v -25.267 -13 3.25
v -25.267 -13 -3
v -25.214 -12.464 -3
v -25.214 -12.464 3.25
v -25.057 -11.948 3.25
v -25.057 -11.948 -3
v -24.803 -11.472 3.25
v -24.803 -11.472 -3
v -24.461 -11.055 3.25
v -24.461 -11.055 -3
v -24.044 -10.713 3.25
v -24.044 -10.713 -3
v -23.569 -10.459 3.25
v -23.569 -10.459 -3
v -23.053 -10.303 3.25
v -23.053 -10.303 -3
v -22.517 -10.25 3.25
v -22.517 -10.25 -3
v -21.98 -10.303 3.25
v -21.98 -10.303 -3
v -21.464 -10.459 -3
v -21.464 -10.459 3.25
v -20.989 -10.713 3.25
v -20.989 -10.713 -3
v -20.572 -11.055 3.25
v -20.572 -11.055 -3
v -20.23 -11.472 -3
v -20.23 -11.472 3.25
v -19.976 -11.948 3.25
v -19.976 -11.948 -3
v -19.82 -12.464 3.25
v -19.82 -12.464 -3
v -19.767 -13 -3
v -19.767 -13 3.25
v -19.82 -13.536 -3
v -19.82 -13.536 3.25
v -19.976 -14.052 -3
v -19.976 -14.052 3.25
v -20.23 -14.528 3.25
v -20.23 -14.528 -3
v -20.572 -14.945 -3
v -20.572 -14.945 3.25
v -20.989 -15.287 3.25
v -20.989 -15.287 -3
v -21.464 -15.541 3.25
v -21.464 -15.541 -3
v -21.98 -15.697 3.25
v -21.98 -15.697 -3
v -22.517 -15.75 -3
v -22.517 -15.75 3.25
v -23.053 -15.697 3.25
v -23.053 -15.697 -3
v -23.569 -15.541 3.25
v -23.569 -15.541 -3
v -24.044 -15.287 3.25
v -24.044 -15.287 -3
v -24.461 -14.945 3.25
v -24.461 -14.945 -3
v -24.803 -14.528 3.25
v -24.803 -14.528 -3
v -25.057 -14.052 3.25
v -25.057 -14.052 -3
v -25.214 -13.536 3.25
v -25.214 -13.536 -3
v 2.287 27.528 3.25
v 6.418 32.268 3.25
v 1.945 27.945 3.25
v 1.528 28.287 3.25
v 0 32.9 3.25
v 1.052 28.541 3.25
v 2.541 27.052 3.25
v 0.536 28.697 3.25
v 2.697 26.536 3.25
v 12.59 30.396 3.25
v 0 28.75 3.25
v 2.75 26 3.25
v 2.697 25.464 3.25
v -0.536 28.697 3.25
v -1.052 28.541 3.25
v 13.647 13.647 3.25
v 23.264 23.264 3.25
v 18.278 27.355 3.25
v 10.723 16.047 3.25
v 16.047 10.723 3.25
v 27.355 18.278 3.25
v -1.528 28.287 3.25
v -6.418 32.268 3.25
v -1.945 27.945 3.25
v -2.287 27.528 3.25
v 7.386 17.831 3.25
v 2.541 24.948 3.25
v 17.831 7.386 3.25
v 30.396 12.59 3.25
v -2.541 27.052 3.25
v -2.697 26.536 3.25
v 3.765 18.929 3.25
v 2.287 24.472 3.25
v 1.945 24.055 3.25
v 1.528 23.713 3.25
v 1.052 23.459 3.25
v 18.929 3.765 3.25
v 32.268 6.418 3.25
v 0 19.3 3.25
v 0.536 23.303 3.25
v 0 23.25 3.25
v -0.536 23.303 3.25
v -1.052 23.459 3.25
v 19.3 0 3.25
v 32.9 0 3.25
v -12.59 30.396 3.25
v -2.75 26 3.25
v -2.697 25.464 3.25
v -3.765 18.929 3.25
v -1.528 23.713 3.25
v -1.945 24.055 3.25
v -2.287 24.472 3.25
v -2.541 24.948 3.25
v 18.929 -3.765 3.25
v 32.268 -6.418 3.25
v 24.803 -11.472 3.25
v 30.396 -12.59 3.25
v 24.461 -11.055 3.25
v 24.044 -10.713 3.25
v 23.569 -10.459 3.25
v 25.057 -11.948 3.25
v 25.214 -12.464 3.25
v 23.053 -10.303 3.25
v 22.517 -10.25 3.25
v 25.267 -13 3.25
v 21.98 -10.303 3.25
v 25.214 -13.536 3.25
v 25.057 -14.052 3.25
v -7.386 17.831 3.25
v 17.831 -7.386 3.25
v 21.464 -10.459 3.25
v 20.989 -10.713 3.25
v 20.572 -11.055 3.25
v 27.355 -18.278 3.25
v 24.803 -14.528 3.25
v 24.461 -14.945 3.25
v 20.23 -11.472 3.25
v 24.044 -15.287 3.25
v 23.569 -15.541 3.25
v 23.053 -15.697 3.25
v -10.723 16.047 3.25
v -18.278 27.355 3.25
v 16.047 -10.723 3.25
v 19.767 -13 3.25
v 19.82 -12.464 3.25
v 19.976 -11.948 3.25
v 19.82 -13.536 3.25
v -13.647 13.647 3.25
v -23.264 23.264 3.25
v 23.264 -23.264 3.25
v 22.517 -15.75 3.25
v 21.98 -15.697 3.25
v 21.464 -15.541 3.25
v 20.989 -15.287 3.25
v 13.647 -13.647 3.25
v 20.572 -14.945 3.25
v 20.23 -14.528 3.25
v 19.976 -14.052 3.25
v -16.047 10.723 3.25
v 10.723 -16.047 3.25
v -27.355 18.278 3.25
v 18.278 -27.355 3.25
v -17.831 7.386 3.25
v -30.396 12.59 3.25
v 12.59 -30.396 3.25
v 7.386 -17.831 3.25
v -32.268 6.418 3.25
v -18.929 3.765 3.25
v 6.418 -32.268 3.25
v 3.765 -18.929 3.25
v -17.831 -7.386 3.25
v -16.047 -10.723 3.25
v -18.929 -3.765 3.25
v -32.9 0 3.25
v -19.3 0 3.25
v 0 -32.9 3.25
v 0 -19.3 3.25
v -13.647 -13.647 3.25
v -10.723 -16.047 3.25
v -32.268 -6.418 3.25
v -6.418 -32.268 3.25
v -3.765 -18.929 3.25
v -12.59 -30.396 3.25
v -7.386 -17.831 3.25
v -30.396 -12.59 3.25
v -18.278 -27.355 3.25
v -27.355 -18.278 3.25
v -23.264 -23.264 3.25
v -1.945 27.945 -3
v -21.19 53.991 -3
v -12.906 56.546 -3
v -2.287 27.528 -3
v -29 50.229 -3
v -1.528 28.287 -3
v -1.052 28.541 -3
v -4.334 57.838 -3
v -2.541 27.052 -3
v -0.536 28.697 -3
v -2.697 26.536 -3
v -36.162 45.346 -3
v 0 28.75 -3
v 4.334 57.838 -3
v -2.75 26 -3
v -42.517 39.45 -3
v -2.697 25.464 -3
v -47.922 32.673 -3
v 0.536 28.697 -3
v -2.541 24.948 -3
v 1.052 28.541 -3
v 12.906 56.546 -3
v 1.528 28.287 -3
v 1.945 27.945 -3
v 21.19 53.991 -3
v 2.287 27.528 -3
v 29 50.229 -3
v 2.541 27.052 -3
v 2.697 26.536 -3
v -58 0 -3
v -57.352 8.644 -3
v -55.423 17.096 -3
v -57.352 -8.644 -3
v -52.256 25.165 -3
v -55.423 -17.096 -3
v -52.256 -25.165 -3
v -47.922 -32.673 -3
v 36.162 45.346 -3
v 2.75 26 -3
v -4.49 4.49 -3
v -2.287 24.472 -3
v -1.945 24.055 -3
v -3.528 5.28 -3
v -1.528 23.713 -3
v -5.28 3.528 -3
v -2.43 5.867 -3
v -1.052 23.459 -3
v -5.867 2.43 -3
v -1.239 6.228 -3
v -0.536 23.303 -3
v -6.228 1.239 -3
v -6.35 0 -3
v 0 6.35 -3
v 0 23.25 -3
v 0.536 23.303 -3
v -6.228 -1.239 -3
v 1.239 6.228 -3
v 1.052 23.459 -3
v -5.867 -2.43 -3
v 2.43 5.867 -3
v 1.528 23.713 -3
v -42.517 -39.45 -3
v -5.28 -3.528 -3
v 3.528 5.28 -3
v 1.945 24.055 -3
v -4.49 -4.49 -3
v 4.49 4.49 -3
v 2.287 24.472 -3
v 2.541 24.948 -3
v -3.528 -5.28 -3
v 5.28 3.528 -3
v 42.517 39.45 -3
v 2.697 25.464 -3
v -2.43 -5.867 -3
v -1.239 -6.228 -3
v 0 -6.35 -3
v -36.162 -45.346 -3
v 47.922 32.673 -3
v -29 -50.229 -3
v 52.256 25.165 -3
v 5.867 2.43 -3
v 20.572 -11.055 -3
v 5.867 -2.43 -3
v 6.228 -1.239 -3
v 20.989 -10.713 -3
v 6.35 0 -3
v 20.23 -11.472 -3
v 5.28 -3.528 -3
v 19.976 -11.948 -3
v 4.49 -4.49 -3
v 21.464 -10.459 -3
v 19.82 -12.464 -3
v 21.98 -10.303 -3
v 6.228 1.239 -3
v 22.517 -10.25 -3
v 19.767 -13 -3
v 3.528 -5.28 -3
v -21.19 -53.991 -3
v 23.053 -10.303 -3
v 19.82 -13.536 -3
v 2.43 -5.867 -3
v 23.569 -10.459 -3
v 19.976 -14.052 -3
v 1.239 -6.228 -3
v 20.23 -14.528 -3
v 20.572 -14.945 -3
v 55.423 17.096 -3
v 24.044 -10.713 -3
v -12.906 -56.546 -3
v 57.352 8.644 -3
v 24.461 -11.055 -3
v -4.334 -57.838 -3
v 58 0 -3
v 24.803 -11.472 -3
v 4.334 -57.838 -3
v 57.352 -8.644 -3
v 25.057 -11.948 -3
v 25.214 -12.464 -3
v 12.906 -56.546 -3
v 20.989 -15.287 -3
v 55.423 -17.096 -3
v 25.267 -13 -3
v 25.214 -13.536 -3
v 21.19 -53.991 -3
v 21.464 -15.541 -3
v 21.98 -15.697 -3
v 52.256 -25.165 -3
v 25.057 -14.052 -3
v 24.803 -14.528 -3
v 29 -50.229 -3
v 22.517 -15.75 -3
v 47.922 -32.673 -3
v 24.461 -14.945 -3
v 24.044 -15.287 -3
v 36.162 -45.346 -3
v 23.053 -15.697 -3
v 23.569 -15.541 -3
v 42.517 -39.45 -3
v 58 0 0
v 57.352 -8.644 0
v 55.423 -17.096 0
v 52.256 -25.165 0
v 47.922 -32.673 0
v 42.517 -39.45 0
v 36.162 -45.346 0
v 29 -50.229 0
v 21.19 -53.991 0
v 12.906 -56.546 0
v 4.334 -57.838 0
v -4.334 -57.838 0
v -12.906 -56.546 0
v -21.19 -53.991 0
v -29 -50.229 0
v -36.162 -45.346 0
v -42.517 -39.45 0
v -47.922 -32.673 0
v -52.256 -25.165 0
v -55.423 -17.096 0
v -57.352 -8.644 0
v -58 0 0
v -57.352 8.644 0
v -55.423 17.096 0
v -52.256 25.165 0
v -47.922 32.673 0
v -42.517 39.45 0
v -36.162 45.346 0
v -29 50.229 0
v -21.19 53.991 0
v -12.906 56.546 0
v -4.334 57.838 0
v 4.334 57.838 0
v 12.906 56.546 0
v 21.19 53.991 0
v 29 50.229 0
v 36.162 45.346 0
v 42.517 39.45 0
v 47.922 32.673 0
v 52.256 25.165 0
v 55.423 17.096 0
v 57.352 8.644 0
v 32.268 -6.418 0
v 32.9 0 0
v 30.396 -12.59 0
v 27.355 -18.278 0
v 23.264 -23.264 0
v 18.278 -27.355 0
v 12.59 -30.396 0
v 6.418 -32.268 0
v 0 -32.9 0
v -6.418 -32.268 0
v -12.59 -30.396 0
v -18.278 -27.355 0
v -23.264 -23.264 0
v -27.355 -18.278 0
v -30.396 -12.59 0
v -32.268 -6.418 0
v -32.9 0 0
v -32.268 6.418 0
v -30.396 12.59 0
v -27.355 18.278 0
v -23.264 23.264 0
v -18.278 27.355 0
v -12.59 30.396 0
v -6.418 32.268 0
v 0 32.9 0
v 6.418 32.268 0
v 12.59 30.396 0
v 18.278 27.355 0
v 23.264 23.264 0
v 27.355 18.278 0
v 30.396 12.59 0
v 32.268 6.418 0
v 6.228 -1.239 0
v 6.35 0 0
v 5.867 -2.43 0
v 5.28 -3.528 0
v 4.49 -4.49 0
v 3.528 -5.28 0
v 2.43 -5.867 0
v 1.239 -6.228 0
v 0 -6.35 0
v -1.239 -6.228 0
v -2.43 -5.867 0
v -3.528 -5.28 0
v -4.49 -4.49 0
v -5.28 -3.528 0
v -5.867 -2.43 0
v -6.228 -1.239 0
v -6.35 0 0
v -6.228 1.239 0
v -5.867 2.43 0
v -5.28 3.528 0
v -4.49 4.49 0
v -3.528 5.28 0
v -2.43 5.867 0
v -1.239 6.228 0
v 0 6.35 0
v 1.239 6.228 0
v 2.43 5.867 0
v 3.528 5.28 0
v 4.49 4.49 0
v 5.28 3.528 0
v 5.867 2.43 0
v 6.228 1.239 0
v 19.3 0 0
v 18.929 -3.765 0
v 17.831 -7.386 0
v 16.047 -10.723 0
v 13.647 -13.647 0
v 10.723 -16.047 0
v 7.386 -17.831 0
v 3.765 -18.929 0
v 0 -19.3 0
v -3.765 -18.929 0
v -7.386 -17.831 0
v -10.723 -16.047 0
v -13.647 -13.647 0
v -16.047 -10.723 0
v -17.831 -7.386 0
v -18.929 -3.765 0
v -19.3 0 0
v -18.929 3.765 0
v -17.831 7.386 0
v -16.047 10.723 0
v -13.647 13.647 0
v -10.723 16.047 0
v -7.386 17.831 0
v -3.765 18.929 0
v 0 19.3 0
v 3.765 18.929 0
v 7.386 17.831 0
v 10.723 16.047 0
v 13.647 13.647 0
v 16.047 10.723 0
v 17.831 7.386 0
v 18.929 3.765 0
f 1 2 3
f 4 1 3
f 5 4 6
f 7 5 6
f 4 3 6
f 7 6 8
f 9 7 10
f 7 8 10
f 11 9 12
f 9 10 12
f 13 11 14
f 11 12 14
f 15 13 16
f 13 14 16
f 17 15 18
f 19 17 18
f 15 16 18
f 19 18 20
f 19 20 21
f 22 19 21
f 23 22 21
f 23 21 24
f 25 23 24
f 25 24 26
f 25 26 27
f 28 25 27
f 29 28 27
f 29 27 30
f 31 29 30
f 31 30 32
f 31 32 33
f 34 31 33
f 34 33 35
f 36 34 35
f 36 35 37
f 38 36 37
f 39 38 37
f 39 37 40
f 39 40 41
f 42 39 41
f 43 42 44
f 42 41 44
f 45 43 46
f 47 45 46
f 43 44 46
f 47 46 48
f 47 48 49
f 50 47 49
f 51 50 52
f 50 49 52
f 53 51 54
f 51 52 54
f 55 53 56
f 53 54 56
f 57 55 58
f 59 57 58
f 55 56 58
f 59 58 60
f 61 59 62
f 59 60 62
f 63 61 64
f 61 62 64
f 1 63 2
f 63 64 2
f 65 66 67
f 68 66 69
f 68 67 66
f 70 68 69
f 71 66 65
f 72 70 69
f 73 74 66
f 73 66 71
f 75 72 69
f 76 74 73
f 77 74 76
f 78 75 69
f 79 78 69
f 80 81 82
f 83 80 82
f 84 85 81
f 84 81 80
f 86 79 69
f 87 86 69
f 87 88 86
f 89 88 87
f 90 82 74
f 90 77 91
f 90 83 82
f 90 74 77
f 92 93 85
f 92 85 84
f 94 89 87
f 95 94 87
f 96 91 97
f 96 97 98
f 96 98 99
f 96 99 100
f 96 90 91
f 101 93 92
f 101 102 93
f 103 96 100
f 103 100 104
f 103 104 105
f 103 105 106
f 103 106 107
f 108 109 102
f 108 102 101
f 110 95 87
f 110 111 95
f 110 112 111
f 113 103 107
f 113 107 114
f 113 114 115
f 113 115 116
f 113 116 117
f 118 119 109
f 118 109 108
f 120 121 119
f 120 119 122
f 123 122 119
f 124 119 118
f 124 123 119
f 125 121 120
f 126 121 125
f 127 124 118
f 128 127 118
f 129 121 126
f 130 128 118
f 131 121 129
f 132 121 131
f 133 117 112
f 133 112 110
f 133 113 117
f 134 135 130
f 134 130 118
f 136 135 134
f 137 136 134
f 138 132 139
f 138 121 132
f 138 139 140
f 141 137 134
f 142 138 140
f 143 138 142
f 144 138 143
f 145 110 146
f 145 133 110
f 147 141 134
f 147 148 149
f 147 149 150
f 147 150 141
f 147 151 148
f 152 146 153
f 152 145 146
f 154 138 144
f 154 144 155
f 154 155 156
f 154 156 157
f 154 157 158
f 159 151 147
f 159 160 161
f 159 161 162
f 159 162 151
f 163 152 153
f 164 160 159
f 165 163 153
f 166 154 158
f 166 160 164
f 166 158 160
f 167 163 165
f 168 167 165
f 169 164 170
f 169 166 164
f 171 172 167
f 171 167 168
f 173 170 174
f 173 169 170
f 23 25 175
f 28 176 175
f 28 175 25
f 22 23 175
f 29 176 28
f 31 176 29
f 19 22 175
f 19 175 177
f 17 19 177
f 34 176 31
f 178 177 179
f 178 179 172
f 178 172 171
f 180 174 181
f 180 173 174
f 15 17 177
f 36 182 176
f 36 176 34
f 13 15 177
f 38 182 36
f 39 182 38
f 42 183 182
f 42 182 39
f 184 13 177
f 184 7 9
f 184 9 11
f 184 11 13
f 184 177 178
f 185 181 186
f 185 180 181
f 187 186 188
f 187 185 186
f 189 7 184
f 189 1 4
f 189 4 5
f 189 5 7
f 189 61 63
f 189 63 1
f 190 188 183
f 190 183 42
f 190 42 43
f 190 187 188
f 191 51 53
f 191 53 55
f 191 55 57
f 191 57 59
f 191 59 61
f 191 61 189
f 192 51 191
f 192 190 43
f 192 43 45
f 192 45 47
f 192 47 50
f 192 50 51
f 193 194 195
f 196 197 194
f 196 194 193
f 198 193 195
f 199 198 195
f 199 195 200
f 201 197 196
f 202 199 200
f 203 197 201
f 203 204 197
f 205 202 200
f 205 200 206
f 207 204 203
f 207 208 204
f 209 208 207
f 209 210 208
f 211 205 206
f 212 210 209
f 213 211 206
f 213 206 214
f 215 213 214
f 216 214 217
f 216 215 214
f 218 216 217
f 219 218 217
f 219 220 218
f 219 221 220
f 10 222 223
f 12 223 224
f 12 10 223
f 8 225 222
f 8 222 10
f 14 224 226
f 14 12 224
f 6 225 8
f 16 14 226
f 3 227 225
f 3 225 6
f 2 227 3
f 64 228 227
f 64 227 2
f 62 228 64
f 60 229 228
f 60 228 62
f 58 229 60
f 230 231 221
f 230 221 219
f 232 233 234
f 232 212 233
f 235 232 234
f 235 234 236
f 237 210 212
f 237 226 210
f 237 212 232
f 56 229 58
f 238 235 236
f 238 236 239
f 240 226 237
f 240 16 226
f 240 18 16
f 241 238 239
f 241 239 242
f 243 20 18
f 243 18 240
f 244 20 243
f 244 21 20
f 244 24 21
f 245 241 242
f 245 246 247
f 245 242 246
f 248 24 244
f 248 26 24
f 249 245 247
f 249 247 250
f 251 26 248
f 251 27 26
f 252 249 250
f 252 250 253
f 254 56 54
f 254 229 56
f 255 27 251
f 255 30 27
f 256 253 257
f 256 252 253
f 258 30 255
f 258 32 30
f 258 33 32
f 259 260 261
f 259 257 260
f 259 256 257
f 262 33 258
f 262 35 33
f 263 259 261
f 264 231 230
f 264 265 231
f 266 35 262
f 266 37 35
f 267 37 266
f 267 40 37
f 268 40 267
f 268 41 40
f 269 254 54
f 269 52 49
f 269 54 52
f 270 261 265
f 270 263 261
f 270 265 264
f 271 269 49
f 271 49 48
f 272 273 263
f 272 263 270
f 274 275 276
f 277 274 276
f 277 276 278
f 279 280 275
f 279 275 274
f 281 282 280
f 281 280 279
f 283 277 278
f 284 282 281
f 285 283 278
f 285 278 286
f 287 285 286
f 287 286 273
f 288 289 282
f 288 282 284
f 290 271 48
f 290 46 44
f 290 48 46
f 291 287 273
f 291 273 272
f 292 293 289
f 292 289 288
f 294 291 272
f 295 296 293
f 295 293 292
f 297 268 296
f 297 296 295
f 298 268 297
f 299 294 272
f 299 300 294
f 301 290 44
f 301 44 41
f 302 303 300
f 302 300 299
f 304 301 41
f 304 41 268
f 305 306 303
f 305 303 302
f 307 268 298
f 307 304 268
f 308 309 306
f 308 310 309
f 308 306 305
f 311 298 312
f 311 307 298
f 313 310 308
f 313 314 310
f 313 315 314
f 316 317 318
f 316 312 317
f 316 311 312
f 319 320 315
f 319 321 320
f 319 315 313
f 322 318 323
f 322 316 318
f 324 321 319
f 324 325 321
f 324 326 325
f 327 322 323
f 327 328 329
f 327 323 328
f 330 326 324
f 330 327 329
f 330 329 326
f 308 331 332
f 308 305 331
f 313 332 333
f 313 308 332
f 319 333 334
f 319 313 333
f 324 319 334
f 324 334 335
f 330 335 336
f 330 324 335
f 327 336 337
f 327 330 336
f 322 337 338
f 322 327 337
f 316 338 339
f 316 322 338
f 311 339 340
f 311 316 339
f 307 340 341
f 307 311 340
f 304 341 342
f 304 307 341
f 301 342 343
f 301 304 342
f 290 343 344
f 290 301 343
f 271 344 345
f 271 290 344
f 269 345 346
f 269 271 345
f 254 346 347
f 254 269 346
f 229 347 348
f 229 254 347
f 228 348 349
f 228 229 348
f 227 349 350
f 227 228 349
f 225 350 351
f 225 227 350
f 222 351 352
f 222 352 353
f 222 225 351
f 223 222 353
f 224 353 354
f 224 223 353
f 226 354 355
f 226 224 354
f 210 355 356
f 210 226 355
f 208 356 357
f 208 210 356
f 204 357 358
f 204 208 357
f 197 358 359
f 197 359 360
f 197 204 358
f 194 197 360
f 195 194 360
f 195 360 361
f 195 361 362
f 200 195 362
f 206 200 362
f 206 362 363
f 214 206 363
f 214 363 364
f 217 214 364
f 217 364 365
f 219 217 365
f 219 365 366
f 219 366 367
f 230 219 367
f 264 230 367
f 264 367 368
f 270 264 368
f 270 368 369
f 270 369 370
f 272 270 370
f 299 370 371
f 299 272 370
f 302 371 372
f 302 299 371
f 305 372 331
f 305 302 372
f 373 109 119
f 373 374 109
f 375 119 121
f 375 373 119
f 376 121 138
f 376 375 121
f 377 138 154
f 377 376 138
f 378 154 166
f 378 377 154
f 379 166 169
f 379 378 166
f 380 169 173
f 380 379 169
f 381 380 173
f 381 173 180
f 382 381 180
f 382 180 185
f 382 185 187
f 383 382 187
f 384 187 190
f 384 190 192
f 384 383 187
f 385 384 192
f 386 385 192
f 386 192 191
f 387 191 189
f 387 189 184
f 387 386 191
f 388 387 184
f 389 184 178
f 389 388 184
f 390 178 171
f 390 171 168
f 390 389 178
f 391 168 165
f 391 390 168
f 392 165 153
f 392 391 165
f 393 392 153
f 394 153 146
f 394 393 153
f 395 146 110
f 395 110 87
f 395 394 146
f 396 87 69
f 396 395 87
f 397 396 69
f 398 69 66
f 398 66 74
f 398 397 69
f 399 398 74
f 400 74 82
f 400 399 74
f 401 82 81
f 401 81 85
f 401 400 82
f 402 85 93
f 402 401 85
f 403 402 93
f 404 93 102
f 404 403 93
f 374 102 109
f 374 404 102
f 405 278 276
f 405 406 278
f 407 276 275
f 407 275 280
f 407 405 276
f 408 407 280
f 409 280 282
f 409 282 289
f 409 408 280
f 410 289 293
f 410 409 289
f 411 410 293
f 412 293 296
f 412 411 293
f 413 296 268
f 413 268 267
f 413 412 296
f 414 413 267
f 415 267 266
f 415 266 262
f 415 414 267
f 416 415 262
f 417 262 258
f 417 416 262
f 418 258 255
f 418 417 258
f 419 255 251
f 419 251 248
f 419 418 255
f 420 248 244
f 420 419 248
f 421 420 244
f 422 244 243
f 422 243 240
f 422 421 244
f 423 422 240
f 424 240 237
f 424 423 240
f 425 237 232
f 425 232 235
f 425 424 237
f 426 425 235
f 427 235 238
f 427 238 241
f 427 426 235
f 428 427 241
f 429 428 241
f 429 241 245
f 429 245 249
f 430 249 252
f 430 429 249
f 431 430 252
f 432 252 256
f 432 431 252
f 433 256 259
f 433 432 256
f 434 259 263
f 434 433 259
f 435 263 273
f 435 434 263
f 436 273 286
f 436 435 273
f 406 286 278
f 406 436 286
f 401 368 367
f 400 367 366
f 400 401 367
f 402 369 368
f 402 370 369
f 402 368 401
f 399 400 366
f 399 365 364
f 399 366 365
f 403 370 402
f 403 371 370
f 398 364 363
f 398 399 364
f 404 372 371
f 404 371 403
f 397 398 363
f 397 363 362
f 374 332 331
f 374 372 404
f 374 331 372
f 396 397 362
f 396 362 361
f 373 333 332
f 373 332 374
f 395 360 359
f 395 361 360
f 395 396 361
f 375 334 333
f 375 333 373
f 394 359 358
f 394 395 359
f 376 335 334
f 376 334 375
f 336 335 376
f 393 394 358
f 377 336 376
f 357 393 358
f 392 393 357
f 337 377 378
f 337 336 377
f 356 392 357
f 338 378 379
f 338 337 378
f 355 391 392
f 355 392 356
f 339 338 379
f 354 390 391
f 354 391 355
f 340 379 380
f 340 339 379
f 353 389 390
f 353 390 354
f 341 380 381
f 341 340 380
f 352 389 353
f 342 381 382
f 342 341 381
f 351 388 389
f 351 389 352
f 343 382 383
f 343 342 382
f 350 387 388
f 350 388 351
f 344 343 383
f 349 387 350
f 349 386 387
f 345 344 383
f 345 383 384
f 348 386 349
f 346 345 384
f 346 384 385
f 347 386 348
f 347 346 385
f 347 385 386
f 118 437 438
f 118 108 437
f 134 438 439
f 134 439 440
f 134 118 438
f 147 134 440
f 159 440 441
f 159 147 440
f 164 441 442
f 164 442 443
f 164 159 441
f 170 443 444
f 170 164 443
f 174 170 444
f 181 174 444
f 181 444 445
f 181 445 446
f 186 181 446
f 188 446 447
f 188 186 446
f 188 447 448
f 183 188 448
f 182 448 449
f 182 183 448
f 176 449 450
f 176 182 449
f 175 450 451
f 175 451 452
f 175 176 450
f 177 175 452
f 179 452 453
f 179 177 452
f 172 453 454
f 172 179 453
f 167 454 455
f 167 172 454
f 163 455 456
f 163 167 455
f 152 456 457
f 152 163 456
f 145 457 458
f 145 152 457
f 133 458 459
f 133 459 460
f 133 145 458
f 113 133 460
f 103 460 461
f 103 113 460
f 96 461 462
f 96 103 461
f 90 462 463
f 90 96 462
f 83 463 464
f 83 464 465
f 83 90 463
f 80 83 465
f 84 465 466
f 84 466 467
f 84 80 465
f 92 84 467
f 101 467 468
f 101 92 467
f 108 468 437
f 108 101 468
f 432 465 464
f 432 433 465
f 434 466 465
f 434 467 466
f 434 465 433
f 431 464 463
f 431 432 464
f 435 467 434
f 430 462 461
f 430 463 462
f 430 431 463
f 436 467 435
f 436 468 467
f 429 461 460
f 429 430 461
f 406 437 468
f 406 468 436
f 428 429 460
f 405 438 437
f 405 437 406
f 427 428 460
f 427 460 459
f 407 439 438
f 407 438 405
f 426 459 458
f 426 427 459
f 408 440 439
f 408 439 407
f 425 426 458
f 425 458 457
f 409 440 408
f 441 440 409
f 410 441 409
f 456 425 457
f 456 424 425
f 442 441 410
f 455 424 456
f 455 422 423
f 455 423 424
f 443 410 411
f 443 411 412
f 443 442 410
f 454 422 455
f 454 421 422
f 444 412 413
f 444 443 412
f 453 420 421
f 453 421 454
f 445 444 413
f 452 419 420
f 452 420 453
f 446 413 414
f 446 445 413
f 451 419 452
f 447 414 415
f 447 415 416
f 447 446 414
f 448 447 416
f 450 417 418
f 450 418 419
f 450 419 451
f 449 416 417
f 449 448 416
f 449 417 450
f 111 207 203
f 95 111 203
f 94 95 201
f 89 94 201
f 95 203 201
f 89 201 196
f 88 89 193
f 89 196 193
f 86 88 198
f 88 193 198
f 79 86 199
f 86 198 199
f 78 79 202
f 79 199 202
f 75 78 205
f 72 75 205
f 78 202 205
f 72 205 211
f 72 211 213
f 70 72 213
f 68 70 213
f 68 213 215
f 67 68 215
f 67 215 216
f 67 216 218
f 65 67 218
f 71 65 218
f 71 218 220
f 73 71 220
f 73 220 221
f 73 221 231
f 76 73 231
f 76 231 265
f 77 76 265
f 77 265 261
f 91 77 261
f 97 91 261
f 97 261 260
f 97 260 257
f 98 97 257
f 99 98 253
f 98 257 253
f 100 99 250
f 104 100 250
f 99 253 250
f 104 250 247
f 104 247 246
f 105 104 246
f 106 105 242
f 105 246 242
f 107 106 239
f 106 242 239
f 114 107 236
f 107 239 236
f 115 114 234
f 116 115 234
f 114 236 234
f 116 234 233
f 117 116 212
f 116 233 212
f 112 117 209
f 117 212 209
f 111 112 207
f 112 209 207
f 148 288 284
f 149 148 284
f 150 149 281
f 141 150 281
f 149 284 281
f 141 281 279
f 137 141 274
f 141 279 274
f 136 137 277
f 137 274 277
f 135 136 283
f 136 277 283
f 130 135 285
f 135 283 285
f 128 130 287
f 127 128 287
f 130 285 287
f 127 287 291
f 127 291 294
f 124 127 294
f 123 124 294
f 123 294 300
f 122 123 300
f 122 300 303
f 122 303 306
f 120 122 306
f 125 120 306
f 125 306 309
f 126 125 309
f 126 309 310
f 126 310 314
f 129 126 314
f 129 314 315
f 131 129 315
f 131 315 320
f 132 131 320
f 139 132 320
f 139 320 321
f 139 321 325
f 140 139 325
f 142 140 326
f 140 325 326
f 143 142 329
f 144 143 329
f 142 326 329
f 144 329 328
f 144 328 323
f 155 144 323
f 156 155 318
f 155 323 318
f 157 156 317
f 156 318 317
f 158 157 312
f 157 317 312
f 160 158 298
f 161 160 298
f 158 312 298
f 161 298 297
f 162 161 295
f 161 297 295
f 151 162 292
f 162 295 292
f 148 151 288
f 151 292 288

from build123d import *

# Parameters (mm, degrees)
M5_CLEARANCE_HOLE1_D = 5.5


with BuildPart() as part:
    # Sketch4 → Revolve1 (revolve)
    with BuildSketch(Plane(origin=(0, 0, 0), x_dir=(1, 0, 0), z_dir=(0, 1, 0))):
        Polygon((6.35, 0), (19.3, 0), (19.3, -3.25), (32.9, -3.25), (32.9, 0), (58, 0), (58, 3), (6.35, 3), align=None)
    revolve(axis=Axis((0, 0, 0), (0, 0, -1)))

    # M5 Clearance Hole1 (through all)
    with Locations(Plane.XY.offset(3.25)):
        with Locations((0, 26), (-22.516660498, -13), (22.516660498, -13)):
            Hole(M5_CLEARANCE_HOLE1_D / 2)


solid = part.part
